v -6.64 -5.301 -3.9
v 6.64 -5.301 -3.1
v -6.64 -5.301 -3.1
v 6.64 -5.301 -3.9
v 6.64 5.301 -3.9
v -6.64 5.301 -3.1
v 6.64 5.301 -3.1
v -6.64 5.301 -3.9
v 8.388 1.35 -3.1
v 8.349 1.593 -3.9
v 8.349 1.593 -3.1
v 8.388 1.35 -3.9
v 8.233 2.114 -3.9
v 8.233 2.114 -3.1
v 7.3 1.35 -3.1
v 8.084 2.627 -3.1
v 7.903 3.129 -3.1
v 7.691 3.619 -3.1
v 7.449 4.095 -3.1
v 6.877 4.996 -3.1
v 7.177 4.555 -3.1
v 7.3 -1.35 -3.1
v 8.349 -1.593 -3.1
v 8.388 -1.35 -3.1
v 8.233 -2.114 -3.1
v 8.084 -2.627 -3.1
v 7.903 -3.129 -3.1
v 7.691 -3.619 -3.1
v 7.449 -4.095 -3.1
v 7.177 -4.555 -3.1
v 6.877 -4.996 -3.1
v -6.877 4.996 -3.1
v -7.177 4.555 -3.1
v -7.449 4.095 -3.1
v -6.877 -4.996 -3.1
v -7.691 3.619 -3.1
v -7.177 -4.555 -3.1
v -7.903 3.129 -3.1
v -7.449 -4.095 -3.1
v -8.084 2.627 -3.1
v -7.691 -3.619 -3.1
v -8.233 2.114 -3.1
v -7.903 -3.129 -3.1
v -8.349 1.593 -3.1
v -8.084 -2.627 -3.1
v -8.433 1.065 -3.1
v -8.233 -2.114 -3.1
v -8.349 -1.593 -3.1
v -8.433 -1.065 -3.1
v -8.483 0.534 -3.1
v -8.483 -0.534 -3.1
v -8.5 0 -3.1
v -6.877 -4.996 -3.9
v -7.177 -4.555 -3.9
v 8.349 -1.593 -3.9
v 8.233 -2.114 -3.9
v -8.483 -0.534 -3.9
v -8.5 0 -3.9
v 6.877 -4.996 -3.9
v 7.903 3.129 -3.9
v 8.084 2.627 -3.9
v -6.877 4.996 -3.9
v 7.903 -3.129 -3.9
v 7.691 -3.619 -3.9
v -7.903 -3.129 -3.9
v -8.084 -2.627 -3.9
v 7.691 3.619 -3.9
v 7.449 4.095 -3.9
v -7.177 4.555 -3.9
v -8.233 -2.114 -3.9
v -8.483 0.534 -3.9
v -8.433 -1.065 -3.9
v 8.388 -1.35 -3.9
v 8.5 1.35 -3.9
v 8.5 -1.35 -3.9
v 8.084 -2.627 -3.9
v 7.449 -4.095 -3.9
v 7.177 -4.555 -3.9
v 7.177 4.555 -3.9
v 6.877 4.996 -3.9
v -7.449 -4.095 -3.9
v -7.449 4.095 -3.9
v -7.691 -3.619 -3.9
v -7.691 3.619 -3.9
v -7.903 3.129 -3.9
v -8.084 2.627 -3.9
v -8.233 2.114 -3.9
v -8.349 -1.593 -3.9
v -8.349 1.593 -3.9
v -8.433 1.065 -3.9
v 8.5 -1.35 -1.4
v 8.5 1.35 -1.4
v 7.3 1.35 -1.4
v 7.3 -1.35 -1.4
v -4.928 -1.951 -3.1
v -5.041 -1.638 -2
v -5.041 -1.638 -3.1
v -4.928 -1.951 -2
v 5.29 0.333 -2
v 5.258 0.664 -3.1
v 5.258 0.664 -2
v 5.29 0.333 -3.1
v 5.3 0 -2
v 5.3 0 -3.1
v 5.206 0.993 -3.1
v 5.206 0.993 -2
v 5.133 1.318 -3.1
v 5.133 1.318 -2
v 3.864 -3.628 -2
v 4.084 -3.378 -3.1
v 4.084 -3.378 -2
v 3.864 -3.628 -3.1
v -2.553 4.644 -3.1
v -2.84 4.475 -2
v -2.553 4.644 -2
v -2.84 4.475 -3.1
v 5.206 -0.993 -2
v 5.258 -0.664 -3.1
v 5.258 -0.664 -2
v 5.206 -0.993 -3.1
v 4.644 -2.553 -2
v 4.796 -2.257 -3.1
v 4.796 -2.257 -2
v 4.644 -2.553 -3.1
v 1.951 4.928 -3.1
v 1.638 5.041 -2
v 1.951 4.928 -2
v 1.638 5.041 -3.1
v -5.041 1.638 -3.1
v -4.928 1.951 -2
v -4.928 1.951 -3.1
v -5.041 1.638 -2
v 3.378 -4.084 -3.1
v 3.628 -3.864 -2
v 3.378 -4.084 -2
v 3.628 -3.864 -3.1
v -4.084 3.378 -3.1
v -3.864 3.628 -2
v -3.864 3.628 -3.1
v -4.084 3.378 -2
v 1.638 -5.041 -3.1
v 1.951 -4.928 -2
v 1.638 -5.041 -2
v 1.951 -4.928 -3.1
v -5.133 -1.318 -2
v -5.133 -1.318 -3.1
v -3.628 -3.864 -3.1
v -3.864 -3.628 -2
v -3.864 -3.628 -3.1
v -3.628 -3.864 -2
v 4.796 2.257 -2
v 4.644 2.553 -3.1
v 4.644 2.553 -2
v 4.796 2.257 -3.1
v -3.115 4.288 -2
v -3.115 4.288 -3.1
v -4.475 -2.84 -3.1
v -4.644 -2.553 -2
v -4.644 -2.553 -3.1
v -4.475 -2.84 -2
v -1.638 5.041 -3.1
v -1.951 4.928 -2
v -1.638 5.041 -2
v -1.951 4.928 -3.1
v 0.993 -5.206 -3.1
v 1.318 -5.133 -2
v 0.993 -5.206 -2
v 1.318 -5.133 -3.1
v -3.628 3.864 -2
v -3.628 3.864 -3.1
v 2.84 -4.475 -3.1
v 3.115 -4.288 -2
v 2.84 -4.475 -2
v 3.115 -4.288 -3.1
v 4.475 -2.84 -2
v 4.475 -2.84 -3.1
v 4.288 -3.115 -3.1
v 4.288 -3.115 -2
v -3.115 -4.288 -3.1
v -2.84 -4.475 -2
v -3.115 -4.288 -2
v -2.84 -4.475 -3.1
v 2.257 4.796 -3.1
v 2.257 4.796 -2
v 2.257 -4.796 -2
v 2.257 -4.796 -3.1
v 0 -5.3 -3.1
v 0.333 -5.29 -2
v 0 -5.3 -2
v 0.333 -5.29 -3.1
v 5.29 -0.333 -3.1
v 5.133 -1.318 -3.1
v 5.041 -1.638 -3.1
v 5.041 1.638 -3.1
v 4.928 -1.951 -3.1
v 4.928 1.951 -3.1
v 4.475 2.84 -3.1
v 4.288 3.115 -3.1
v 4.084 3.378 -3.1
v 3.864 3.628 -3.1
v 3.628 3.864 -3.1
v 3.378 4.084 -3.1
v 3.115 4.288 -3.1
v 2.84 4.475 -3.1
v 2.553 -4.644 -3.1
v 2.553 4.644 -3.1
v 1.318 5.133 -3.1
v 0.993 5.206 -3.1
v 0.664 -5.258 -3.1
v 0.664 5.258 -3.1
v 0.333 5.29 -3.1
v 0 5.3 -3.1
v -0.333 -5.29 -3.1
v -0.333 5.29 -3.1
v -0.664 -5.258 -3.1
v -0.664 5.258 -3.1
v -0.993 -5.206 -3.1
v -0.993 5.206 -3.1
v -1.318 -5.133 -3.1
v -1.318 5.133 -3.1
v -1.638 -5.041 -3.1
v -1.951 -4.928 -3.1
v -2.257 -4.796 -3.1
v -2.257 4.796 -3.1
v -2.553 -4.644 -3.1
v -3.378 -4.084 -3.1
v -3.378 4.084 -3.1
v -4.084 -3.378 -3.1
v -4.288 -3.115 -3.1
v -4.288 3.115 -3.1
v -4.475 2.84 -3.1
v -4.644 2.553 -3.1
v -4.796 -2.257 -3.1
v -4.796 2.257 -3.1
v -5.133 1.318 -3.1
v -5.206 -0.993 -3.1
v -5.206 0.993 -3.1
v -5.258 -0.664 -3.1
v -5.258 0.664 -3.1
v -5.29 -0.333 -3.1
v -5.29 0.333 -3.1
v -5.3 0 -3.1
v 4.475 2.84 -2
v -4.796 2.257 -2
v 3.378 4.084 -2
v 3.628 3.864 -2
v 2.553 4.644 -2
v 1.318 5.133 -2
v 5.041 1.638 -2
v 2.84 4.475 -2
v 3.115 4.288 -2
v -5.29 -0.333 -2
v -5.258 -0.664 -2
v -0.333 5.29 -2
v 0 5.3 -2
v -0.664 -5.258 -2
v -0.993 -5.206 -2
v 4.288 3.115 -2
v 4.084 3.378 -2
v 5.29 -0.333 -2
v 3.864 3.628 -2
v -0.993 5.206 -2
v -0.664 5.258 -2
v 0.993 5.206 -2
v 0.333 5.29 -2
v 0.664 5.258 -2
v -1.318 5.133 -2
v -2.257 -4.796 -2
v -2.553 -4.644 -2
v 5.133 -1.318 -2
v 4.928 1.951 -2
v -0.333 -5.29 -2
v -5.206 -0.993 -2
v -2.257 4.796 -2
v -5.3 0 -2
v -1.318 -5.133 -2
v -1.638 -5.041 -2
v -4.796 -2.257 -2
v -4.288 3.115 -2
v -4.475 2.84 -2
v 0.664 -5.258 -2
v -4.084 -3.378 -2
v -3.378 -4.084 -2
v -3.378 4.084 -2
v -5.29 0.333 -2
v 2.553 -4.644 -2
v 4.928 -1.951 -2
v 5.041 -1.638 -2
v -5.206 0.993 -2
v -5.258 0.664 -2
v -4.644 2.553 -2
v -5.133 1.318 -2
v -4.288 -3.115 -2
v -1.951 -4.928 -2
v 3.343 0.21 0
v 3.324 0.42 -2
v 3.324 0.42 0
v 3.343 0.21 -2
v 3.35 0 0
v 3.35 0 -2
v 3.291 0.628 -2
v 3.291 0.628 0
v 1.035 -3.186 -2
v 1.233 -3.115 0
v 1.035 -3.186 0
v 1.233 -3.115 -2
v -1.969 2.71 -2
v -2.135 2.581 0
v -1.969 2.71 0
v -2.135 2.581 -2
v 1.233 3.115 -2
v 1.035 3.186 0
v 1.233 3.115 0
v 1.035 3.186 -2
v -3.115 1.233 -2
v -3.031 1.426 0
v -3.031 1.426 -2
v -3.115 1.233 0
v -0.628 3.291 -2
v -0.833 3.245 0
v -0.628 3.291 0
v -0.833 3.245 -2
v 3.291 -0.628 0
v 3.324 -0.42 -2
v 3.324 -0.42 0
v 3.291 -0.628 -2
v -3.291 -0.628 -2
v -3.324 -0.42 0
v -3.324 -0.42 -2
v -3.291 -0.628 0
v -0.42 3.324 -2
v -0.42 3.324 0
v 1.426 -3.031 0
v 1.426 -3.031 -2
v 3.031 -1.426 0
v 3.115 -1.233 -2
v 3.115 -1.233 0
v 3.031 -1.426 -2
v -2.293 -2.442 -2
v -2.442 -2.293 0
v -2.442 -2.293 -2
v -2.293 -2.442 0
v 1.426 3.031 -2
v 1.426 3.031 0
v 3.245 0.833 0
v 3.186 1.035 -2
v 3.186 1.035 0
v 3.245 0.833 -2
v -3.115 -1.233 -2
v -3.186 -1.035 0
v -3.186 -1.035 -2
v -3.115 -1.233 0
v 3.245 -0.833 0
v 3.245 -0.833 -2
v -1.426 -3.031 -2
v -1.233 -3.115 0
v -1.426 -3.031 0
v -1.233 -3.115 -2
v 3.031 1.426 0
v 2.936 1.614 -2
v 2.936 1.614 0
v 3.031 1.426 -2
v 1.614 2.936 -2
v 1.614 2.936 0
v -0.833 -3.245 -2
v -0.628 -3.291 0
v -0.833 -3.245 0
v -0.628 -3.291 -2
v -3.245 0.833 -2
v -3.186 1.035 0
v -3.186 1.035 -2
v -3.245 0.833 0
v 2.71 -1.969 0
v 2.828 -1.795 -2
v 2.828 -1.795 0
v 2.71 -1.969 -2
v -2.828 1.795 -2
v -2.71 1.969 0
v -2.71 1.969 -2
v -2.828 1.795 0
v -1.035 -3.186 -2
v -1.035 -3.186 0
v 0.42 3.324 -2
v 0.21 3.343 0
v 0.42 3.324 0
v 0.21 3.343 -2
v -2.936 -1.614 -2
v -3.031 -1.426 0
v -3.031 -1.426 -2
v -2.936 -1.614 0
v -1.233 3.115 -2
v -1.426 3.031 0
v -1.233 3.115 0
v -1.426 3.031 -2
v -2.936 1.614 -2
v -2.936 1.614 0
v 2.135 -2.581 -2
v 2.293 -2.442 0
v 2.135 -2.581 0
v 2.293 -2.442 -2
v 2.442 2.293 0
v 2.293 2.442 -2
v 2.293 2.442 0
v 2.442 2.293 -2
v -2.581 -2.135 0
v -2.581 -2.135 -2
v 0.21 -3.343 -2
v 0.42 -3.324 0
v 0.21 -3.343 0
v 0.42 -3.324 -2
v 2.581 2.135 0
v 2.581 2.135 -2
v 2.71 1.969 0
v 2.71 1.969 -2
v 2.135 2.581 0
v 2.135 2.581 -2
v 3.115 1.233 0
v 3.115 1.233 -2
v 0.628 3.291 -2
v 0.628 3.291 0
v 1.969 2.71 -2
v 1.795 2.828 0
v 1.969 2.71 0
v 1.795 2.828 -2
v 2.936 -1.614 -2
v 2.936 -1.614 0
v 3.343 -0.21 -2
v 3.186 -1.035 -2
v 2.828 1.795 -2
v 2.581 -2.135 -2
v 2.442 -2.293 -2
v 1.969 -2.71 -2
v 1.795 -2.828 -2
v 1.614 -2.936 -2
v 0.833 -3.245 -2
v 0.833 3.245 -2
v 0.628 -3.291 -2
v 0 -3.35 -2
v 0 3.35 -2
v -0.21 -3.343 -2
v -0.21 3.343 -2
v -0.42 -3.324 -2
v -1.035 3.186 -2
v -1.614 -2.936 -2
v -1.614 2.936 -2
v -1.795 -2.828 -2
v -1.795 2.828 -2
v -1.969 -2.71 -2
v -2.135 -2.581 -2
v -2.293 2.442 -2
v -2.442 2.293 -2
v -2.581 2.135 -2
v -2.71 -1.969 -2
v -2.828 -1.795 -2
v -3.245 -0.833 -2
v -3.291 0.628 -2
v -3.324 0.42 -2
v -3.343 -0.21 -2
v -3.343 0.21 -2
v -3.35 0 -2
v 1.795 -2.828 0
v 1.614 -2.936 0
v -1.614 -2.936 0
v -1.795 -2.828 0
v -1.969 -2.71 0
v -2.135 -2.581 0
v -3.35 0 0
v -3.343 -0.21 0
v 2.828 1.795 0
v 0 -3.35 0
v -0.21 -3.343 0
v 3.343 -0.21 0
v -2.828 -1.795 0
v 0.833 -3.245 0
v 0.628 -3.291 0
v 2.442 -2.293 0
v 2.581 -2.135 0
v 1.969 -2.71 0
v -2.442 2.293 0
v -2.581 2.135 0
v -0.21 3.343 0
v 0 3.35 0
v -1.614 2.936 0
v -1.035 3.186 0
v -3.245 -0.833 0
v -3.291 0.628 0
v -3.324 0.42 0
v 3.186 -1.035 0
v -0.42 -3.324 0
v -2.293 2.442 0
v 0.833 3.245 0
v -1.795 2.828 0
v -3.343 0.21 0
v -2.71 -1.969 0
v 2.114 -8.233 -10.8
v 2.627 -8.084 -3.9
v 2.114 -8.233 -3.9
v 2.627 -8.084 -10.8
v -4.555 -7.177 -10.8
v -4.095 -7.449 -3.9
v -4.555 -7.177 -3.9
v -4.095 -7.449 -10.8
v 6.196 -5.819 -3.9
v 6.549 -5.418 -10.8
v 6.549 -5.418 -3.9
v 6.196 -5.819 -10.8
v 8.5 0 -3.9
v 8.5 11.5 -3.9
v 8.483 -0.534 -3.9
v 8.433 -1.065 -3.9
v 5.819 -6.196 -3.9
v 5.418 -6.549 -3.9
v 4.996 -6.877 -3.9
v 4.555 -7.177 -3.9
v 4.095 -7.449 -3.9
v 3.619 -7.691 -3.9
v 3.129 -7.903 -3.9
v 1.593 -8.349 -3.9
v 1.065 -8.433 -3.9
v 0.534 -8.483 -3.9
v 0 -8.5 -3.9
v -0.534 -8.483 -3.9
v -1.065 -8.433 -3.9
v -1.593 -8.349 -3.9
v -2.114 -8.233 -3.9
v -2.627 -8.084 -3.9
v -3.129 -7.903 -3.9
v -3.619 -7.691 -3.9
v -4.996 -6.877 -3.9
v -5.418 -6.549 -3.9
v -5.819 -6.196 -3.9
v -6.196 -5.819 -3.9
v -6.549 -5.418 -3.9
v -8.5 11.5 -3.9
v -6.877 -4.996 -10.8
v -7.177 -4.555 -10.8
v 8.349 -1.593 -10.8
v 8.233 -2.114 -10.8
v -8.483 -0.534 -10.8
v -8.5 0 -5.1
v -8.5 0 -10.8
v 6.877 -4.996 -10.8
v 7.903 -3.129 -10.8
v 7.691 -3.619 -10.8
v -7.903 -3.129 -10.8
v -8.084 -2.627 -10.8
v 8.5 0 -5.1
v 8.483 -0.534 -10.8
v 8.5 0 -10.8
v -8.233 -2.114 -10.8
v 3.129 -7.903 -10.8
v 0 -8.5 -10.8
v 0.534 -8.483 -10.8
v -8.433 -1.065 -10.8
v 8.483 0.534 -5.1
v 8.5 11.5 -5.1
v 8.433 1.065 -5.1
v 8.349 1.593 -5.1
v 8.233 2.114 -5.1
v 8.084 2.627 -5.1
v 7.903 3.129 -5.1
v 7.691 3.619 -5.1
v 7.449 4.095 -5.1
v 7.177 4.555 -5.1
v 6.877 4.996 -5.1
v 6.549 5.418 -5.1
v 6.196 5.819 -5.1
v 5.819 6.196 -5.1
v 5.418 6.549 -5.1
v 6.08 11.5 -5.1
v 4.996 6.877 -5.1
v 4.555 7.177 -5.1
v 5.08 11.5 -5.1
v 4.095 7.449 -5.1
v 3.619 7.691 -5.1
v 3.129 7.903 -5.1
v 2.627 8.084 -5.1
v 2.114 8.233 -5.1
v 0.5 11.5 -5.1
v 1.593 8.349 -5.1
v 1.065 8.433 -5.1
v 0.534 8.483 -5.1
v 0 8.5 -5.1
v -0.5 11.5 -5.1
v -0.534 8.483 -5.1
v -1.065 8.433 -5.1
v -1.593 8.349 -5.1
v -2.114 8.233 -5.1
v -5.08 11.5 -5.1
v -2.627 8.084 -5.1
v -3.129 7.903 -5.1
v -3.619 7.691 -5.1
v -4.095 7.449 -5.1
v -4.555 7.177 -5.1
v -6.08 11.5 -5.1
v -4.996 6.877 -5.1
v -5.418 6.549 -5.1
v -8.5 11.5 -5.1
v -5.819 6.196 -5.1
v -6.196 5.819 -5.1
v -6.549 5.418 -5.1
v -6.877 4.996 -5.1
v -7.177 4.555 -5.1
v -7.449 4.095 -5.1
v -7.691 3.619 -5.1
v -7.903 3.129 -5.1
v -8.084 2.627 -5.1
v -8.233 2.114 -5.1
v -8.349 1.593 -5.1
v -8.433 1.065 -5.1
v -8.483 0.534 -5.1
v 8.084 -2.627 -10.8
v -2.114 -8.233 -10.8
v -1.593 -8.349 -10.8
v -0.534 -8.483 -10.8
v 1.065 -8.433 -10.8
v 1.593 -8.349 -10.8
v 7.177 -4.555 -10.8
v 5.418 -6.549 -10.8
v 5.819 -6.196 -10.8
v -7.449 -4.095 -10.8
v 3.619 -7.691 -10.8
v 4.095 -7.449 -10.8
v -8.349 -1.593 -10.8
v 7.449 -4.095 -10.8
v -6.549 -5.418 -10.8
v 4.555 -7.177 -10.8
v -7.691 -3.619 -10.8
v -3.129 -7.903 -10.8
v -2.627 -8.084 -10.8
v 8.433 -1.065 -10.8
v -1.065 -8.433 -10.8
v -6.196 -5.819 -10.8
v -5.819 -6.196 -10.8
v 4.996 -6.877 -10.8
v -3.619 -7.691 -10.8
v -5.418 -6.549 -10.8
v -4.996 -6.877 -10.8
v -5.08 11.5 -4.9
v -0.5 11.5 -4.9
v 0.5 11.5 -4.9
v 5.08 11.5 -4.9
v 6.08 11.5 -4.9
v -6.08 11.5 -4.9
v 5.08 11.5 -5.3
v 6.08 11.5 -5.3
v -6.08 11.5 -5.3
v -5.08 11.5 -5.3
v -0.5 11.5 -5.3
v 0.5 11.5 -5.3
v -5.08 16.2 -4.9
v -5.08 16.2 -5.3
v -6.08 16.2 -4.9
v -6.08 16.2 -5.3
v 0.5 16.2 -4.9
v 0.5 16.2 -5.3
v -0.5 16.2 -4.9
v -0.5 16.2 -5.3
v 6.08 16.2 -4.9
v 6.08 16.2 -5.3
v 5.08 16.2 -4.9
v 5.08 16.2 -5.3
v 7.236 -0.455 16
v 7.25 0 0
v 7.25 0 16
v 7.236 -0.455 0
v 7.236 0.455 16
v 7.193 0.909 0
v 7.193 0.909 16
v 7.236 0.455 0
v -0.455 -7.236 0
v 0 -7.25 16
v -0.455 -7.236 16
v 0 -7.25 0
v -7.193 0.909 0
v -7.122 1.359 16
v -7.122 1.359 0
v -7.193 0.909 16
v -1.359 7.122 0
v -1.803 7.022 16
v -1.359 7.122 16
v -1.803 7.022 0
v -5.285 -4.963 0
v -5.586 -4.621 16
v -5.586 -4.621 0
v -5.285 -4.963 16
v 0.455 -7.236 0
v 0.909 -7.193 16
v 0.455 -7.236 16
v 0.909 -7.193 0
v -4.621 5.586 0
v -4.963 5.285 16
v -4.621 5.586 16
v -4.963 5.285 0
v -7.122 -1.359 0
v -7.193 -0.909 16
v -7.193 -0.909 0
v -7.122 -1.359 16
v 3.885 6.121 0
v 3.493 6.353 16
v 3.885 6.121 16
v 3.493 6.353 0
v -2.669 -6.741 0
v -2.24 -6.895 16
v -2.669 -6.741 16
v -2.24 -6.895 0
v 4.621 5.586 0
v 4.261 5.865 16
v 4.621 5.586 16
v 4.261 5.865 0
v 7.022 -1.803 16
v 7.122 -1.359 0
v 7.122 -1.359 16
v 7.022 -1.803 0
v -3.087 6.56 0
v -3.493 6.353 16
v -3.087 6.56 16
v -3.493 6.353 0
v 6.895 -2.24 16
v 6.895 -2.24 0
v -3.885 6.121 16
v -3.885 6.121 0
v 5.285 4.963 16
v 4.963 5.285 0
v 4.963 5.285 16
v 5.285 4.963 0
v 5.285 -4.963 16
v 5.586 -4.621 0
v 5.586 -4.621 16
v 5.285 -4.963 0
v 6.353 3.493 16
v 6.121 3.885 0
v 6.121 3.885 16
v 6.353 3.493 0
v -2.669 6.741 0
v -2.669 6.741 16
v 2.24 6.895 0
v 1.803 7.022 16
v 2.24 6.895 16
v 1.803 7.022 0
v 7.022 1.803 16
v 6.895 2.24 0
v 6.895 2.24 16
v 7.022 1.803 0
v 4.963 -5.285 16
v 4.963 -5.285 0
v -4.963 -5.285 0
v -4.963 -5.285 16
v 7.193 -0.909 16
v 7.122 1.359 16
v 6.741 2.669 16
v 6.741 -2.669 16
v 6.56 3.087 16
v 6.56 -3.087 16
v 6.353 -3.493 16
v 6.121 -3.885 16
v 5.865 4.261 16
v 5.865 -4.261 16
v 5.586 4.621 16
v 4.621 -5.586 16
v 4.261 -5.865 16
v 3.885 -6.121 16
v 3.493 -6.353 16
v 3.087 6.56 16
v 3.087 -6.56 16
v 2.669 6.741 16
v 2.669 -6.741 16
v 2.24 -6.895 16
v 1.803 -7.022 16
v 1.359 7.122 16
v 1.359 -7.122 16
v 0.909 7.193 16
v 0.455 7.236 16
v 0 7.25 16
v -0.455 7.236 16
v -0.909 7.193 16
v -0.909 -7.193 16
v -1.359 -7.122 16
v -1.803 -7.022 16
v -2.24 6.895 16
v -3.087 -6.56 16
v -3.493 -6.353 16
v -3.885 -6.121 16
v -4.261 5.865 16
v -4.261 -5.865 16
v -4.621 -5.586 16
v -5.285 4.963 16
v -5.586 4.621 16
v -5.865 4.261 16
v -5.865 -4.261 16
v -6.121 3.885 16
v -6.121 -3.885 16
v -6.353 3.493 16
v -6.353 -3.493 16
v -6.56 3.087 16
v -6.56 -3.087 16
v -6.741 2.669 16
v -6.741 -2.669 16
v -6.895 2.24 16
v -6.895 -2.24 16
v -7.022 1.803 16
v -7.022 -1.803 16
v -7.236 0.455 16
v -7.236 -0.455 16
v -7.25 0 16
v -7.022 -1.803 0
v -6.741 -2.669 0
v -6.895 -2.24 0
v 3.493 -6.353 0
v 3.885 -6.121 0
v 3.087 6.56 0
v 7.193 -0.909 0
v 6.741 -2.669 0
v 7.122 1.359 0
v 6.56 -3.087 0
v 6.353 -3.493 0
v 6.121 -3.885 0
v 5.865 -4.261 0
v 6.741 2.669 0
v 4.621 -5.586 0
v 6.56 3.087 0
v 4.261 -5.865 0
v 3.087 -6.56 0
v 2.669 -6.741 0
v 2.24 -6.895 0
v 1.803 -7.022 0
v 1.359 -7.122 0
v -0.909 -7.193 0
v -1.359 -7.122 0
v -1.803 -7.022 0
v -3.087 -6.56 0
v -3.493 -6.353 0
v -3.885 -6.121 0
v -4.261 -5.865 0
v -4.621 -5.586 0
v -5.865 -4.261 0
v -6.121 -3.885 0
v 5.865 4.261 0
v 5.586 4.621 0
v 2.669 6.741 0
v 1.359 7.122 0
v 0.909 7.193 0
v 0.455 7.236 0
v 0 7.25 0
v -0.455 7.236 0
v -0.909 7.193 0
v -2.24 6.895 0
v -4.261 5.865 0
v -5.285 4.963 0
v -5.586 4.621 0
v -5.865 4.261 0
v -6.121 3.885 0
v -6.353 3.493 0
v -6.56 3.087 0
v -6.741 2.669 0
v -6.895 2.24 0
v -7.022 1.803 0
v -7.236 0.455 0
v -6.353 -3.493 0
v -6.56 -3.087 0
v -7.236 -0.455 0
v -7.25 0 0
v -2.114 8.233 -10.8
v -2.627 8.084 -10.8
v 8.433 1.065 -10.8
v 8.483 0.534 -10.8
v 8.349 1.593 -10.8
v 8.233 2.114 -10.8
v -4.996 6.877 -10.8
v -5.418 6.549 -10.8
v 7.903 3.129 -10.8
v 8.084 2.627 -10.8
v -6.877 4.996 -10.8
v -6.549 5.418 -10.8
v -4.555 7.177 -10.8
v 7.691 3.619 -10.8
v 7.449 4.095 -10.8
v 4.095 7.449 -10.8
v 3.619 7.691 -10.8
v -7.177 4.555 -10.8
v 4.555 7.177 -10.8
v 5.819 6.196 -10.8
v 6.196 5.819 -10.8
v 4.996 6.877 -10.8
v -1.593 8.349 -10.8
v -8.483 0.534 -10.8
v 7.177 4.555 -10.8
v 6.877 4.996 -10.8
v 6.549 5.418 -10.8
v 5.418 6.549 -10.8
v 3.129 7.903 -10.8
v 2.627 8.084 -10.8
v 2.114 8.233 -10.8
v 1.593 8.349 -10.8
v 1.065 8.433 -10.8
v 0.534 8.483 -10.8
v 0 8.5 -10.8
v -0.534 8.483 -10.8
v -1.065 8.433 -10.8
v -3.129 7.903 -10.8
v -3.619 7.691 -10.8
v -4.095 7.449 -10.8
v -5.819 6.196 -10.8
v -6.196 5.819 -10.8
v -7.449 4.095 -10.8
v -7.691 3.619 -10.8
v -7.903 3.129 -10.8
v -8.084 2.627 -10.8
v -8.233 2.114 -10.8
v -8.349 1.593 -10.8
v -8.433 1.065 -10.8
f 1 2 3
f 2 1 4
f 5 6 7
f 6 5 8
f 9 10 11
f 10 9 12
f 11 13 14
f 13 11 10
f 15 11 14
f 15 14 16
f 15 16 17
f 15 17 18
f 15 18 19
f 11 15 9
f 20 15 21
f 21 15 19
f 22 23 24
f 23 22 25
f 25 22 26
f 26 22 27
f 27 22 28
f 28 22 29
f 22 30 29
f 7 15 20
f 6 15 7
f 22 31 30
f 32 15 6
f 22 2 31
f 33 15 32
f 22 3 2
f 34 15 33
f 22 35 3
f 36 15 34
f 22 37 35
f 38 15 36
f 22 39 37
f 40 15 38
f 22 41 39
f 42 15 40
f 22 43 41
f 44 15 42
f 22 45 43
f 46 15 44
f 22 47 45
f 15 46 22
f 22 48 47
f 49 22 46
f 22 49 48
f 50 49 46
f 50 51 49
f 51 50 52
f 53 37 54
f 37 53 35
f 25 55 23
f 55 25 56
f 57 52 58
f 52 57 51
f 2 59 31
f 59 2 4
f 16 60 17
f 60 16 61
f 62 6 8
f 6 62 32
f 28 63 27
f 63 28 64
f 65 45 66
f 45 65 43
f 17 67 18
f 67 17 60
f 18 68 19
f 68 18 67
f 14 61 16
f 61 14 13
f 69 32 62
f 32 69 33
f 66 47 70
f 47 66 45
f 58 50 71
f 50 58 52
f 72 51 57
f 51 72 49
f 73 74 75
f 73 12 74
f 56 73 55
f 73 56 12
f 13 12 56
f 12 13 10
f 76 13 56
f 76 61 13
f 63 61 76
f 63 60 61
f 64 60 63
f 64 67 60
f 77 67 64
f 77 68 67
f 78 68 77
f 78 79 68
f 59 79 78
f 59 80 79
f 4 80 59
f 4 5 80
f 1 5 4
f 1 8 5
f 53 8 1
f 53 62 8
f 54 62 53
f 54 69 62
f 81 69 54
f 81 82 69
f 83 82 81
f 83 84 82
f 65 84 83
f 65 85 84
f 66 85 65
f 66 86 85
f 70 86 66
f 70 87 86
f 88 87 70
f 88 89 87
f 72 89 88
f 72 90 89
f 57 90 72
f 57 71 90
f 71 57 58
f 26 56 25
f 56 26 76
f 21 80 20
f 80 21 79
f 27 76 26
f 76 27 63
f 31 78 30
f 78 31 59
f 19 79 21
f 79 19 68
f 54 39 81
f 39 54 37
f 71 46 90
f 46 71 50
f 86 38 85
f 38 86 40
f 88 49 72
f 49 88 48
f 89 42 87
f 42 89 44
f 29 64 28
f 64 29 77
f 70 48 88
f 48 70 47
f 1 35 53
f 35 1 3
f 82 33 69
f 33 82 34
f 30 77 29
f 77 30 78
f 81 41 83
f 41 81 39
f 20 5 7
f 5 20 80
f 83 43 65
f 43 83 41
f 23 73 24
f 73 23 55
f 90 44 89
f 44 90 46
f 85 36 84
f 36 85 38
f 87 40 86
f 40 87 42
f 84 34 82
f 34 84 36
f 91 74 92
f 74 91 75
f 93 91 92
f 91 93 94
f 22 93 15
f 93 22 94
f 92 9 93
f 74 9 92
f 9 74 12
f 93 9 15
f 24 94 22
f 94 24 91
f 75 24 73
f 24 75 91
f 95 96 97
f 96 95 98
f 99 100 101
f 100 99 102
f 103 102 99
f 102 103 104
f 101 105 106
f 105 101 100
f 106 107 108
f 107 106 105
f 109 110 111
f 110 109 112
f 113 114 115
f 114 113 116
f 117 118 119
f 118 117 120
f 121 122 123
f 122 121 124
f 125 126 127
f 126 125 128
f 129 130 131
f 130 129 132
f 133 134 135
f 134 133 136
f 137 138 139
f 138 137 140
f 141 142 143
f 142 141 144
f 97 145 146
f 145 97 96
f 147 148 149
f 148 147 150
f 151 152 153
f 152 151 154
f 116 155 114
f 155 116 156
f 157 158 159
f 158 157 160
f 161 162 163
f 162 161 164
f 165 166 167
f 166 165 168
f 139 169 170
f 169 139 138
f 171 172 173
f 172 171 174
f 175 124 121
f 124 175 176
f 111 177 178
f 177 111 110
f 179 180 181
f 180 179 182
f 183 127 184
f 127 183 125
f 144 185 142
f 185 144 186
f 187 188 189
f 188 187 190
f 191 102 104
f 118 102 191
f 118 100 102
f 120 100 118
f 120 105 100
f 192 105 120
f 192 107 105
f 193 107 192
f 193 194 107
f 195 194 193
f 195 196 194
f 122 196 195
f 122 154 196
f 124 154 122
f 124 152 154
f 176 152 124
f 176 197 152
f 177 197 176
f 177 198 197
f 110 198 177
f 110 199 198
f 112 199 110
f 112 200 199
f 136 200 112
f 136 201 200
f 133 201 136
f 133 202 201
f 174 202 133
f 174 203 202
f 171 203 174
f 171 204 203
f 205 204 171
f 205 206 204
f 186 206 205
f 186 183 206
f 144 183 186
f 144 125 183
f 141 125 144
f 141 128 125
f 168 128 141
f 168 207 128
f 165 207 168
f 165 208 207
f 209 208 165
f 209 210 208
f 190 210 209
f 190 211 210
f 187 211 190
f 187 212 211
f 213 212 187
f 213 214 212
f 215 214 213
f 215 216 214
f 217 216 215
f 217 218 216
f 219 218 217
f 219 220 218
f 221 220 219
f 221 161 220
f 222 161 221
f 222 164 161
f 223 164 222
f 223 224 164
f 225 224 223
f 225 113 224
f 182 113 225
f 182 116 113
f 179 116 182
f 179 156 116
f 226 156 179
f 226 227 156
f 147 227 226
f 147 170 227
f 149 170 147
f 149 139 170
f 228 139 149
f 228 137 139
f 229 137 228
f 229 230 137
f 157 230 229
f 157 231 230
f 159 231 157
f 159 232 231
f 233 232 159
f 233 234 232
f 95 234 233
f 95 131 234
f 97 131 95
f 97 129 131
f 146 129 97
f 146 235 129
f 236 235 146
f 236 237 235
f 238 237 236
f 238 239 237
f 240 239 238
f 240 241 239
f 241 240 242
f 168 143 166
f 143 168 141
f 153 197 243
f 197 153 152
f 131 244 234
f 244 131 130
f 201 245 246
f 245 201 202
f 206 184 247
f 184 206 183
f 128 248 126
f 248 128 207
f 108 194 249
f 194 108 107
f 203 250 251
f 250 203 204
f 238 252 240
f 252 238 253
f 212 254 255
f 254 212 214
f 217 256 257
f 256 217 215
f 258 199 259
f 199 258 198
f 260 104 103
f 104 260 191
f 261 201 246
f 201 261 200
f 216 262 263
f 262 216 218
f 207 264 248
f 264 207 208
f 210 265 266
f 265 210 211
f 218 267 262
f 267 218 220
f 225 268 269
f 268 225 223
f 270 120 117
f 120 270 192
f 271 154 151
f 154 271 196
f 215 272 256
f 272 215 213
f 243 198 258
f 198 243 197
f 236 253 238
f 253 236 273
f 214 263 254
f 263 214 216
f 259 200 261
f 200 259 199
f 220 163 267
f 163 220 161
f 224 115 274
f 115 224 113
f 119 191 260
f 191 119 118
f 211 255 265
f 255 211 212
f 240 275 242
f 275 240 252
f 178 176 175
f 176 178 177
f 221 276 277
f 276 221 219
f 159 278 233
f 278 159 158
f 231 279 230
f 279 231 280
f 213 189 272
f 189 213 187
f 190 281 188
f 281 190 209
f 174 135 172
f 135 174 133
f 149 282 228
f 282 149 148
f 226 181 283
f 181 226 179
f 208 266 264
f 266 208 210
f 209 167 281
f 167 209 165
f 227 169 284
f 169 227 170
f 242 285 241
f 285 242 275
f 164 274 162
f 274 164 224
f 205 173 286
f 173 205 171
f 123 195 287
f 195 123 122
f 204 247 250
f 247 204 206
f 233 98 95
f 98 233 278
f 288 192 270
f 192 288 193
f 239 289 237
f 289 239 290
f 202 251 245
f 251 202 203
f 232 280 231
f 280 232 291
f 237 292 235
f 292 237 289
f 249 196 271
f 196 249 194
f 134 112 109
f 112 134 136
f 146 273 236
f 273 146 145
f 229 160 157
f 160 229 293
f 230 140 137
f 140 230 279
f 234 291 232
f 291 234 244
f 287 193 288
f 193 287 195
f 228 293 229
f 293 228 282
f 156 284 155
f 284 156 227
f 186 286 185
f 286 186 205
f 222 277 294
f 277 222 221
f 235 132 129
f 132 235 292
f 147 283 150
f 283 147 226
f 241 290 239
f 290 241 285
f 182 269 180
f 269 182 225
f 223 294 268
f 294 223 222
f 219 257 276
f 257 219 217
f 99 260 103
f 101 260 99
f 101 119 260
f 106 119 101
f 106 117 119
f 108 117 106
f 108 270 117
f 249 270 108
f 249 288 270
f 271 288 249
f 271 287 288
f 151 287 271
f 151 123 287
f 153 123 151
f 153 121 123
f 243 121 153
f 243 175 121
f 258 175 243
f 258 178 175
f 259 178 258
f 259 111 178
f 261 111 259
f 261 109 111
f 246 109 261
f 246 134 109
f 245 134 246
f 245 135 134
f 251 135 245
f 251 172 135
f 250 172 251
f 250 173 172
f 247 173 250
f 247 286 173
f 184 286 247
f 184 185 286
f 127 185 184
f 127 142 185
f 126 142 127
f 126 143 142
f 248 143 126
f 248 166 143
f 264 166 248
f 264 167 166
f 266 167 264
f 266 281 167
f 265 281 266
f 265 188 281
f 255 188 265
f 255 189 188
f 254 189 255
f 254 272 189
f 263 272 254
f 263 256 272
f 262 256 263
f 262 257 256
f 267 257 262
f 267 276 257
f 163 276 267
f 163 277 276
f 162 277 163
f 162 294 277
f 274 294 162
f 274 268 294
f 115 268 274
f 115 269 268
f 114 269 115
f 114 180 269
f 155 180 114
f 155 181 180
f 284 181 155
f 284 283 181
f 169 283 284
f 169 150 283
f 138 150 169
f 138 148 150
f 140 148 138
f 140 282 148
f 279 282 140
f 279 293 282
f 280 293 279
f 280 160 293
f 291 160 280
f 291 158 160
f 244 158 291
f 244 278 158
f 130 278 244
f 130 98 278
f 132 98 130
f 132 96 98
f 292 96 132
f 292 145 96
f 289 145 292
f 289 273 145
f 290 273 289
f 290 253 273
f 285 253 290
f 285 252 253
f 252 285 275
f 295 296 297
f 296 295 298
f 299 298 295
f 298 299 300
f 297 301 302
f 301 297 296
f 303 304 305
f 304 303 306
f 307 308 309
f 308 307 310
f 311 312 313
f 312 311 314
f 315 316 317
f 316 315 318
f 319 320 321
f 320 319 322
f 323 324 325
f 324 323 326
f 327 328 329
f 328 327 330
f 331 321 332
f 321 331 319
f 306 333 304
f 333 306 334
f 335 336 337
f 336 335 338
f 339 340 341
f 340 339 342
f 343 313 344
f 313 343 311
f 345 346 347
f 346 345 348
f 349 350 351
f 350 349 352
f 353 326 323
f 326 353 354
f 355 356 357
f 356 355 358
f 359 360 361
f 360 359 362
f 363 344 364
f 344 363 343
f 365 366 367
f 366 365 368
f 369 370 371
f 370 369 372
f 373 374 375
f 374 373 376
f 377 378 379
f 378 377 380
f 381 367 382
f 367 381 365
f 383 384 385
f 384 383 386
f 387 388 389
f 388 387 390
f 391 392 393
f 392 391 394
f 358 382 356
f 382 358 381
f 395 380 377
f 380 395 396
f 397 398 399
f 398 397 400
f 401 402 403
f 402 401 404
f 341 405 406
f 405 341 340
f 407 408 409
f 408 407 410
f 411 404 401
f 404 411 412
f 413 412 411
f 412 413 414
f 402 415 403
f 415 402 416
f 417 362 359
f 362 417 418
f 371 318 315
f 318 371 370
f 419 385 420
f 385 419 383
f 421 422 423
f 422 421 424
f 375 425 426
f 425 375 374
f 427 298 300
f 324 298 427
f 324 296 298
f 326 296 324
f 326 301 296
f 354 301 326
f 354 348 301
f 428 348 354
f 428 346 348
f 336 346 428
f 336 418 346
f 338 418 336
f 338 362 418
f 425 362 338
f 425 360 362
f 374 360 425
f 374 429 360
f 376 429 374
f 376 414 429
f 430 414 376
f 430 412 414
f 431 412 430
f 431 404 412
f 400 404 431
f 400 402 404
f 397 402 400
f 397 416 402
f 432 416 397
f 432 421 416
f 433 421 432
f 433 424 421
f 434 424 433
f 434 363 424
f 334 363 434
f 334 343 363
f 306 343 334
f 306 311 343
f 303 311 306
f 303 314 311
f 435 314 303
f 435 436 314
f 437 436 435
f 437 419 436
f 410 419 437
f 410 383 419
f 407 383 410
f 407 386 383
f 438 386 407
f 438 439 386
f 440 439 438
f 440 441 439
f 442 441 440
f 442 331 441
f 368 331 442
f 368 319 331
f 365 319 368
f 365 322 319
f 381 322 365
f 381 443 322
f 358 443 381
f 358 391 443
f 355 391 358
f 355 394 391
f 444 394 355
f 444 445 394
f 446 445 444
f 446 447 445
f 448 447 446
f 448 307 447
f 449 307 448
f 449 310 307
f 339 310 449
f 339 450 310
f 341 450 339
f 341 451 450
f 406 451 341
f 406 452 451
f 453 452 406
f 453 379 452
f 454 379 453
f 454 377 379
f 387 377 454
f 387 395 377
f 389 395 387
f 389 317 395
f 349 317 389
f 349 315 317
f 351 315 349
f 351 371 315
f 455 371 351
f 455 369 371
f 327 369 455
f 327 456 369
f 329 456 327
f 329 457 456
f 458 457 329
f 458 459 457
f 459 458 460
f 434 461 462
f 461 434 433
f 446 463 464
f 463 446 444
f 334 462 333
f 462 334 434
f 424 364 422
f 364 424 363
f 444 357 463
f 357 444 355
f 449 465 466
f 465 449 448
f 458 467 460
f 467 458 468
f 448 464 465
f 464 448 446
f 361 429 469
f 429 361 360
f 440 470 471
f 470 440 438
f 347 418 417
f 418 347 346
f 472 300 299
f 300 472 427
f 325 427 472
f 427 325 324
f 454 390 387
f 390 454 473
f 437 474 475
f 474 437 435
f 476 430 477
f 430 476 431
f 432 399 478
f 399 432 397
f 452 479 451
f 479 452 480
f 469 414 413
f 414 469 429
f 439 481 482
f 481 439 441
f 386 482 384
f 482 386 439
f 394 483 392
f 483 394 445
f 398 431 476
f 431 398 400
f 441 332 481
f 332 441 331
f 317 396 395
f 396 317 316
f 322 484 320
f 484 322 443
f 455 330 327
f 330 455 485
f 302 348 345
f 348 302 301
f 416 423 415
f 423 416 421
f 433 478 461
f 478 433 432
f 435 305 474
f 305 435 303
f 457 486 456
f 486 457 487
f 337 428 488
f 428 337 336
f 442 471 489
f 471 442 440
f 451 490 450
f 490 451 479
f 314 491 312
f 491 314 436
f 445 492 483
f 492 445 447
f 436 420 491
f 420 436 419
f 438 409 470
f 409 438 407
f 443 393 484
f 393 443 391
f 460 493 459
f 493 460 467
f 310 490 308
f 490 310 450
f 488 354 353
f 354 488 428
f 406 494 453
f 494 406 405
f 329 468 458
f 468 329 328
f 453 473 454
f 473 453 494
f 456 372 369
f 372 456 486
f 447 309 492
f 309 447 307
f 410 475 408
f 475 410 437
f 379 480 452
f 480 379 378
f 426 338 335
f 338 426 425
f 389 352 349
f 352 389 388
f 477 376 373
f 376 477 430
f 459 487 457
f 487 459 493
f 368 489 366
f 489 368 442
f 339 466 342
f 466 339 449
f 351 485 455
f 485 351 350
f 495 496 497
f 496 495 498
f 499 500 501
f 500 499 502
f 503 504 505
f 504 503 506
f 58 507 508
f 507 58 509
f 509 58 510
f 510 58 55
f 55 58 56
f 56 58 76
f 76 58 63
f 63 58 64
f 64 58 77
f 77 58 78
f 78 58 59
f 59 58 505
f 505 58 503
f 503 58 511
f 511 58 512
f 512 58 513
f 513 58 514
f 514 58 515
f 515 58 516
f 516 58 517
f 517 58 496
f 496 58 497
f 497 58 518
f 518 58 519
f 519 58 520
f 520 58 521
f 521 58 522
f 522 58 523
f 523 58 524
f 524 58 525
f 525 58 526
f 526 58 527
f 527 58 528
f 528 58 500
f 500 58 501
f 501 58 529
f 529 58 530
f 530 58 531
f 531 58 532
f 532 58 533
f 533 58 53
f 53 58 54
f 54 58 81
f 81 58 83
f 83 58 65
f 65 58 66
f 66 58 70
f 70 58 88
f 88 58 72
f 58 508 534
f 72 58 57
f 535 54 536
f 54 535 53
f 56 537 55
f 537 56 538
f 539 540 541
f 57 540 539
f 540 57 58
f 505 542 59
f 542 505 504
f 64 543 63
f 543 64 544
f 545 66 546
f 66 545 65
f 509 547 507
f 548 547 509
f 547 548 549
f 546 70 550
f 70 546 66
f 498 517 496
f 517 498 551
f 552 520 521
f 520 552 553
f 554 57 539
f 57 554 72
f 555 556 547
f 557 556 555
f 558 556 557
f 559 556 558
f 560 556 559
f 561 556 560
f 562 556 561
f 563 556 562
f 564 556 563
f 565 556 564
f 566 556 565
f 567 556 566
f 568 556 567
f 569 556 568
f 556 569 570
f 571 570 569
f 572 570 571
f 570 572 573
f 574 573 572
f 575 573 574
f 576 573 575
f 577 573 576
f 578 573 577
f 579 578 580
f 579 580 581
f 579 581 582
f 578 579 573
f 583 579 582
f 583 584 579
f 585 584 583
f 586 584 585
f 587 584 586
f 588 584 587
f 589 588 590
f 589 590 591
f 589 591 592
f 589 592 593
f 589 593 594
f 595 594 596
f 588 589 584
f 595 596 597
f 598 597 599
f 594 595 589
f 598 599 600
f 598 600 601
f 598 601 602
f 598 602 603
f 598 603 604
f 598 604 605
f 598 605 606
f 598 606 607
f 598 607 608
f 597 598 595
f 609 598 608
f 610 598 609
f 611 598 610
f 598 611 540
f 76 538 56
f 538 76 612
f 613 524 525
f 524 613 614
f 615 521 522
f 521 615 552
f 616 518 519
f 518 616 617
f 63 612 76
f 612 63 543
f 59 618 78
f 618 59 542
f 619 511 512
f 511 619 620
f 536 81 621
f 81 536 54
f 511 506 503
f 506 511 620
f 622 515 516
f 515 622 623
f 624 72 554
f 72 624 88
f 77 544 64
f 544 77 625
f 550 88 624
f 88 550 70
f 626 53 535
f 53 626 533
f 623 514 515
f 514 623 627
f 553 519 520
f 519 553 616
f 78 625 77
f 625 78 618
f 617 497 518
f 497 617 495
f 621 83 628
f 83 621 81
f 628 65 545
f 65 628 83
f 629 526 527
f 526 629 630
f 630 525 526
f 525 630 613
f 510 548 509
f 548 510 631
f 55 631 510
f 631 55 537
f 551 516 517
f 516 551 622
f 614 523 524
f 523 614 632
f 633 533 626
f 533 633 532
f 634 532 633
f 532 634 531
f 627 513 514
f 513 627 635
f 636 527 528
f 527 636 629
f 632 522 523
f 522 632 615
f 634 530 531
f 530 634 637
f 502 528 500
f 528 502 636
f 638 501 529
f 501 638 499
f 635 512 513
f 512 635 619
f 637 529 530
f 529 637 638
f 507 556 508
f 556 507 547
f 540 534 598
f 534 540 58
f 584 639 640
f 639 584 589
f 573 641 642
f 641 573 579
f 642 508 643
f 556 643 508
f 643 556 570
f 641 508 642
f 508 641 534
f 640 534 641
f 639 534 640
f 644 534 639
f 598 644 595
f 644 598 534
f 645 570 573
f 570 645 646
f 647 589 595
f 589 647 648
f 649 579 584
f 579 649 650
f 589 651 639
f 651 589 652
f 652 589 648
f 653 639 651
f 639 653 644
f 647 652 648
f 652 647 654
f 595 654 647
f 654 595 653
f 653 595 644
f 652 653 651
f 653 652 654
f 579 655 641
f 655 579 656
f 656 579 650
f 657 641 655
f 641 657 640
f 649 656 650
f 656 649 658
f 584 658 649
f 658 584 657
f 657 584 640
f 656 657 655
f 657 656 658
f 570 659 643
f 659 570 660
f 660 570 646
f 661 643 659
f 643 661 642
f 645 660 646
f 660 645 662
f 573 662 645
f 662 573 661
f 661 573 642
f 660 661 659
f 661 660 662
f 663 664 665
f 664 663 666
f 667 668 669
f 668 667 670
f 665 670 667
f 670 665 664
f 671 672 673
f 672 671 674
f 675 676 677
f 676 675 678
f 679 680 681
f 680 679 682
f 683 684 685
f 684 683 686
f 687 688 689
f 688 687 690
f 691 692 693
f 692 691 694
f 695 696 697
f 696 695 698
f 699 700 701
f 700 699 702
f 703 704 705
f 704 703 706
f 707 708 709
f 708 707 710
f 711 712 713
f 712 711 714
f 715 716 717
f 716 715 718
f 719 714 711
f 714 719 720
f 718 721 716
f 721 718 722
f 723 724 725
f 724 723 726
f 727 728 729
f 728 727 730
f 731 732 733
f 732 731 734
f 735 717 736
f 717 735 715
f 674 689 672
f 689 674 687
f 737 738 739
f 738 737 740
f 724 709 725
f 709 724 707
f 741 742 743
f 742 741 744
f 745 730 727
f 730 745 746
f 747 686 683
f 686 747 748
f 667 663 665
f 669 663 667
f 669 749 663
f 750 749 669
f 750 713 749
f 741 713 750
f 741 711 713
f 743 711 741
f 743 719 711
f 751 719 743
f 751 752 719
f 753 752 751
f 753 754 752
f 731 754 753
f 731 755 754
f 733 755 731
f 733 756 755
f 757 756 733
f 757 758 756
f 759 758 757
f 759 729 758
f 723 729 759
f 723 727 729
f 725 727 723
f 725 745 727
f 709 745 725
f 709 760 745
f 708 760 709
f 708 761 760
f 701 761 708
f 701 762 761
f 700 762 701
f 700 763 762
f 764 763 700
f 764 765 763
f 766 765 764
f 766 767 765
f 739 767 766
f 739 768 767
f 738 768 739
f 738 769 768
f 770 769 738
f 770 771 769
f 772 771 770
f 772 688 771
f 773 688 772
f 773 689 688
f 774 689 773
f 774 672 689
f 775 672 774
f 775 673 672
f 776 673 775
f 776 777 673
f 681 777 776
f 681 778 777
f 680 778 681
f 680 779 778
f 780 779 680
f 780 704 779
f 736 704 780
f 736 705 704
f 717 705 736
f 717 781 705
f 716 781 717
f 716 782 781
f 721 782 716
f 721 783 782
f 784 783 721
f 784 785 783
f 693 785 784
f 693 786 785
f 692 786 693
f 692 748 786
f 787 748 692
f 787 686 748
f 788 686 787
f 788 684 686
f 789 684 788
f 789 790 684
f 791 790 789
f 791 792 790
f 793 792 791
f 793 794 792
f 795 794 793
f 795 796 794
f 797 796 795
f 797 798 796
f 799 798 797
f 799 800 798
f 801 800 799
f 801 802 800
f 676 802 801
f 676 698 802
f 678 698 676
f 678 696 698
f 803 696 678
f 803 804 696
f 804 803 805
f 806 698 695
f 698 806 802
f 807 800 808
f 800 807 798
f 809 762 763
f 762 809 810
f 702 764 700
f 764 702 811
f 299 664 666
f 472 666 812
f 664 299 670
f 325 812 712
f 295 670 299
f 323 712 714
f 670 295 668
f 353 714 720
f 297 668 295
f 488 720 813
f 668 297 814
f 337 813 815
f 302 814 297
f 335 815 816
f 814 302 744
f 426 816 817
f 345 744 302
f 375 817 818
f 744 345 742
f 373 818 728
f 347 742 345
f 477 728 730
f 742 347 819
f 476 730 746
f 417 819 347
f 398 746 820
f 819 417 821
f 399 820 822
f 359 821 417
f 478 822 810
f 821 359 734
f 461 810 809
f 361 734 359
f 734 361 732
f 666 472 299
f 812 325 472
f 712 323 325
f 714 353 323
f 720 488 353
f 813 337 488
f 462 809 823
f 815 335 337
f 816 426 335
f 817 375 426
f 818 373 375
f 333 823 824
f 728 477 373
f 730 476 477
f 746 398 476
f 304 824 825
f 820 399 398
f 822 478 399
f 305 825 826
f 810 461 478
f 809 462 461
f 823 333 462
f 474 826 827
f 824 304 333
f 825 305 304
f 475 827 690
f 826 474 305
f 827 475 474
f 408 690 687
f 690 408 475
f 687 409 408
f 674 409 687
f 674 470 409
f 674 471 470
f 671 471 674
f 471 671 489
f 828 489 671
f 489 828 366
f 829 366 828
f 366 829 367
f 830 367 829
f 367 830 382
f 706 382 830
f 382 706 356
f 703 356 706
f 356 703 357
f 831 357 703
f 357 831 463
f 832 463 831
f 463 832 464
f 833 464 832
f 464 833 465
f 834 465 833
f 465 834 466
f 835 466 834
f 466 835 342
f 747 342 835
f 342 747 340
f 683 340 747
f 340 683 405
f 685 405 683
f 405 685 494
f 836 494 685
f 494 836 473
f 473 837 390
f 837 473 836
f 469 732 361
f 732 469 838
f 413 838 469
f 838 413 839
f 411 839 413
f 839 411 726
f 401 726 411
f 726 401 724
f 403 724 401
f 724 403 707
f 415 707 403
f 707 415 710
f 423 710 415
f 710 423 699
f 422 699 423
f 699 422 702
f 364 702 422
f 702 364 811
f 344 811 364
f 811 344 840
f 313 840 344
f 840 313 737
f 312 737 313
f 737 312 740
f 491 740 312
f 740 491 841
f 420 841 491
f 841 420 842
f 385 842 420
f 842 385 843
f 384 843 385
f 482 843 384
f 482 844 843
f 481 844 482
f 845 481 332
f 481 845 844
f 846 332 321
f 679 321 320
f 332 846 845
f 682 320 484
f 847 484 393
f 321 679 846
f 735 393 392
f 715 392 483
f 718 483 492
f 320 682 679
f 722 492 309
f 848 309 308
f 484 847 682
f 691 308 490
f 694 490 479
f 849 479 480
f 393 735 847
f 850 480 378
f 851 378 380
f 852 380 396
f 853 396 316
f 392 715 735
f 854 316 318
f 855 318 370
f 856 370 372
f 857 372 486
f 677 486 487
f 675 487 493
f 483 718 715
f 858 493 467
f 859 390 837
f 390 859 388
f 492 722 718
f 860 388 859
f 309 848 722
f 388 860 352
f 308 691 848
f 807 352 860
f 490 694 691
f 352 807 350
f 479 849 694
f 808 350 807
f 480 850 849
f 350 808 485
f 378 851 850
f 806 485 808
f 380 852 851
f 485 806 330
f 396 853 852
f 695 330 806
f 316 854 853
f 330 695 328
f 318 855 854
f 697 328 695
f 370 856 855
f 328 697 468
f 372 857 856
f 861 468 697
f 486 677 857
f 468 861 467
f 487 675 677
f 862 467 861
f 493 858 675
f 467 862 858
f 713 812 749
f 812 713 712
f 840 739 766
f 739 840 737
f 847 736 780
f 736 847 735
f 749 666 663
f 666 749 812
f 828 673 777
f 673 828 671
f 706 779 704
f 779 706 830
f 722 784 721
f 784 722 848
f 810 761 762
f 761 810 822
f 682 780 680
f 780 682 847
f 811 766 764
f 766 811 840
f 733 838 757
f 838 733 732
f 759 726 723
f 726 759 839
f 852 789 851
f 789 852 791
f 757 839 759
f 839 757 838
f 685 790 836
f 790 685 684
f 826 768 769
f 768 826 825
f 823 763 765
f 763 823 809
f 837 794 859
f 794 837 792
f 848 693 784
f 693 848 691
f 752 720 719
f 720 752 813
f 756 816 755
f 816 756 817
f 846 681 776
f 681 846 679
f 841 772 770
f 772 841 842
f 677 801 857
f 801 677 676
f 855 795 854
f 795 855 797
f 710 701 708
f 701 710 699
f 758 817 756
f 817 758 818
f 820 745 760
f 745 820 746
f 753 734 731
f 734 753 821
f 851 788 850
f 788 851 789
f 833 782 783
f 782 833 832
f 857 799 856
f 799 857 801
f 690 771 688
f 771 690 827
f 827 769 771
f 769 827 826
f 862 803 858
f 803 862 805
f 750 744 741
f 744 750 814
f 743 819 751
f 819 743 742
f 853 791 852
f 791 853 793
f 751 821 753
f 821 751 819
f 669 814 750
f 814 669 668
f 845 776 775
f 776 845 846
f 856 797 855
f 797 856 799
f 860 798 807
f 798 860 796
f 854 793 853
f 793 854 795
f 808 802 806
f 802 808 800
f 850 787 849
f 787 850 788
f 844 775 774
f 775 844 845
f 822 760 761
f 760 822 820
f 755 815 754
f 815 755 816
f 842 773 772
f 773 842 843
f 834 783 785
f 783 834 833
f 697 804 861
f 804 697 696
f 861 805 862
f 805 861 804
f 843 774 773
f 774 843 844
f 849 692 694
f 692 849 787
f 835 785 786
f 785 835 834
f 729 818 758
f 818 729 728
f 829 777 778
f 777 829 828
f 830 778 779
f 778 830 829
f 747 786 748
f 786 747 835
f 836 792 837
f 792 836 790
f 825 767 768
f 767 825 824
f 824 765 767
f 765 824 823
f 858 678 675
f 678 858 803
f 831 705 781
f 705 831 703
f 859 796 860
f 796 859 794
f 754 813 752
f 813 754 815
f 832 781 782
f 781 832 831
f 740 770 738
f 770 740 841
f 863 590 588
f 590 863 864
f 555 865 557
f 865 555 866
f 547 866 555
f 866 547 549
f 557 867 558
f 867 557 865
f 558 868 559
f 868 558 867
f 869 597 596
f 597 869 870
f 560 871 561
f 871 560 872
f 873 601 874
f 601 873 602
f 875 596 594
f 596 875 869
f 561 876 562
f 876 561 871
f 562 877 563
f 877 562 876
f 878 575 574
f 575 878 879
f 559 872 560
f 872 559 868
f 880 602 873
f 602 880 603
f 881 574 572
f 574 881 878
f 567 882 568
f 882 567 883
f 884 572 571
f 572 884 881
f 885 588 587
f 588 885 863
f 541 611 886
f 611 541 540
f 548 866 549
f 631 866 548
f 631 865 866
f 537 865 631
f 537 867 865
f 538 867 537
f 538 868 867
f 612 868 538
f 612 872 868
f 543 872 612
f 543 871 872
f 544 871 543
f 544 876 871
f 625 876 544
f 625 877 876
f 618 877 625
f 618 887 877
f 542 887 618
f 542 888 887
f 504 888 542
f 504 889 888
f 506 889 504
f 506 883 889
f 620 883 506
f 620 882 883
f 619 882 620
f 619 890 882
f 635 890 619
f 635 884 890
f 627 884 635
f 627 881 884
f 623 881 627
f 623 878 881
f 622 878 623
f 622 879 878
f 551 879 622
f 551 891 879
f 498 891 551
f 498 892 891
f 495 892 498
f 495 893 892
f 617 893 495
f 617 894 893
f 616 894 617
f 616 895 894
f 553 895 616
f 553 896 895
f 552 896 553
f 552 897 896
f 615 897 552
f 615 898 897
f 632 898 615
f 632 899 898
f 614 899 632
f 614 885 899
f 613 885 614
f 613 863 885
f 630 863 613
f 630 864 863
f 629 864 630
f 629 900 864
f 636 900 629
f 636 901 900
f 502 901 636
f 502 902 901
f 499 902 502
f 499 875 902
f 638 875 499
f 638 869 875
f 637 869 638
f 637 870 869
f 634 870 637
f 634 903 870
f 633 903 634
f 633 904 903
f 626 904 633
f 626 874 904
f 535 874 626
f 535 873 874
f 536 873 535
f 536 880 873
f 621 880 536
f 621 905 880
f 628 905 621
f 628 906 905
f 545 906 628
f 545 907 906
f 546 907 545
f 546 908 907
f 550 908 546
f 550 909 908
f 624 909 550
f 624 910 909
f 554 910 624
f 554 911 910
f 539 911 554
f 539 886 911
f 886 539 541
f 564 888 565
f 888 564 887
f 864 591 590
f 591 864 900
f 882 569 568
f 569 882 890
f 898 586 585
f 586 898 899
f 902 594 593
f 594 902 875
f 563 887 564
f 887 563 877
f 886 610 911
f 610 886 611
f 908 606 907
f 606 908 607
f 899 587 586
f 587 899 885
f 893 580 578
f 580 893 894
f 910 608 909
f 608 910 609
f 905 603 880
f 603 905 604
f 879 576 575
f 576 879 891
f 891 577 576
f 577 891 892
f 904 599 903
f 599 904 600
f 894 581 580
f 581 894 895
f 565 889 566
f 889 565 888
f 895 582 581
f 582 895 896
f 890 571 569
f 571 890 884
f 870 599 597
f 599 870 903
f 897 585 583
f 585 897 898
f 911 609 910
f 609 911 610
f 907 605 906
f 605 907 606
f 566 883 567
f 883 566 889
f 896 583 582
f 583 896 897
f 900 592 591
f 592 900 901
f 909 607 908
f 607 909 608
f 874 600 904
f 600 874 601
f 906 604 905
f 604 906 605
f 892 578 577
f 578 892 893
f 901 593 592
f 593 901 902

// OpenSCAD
$fn = 100;

Knop_Length = 16;
Knop_Diameter = 14.5;

Thread_Diameter = 6.7;
Thread_Length = 15.2;
Circle_Diameter = 10.6;
Circle_Height = 1.1;

Body_Diameter = 17;
Metal_Base_Thickness = 0.8;

Metal_Pin_Size = [1.2, 2.7, 2.5];

Board_Thickness = 1.2;
Board_Extent = 3;

Body_Back_Height = 5.7;

Pin_Size = [1, 4.7, 0.4];
Pin_Distance = 2.54 * 2;

e = 0.001;

Poti("#A83");

module Poti(knop_color, metal_color = "#999", wall_thickness = 2) {
  // Knob
  color(knop_color)
    cylinder(h = Knop_Length, d = Knop_Diameter);

  translate([0, 0, -wall_thickness])
    color(metal_color) {
      cylinder(h = Thread_Length, d = Thread_Diameter);
      translate([0, 0, -Circle_Height]) {
        cylinder(h = Circle_Height, d = Circle_Diameter);
        translate([0, 0, -Metal_Base_Thickness]) {
          difference() {
            cylinder(h = Metal_Base_Thickness, d = Body_Diameter);
            for (x = [-1, 1])
              translate([0, x * ((Body_Diameter + Circle_Diameter) / 4 + e), Metal_Base_Thickness / 2])
                cube([Body_Diameter, (Body_Diameter - Circle_Diameter) / 2, Metal_Base_Thickness + e], center = true);
          }
          translate([Body_Diameter / 2 - Metal_Pin_Size[0], -Metal_Pin_Size[1] / 2, 0])
            cube(Metal_Pin_Size);
        }
      }
  }

  color("#8A4")
    translate([0, 0, -wall_thickness - Circle_Height - Metal_Base_Thickness - Board_Thickness]) {
      cylinder(h = Board_Thickness, d = Body_Diameter);
      translate([-Body_Diameter / 2, 0, 0])
        cube([Body_Diameter, Body_Diameter / 2 +Board_Extent, Board_Thickness]);
    }

  color("#AA4")
    translate([0, 0, -wall_thickness - Circle_Height - Metal_Base_Thickness - Board_Thickness - Body_Back_Height])
      cylinder(h = Body_Back_Height, d = Body_Diameter);

  color(metal_color)
  for (x = [-1, 0, 1]) {
    translate([x * (Pin_Distance + 0.5), Body_Diameter / 2 + Board_Extent + Pin_Size[1] / 2,
               -wall_thickness - Circle_Height - Metal_Base_Thickness - Board_Thickness])
      cube(Pin_Size, center = true);
  }
}
